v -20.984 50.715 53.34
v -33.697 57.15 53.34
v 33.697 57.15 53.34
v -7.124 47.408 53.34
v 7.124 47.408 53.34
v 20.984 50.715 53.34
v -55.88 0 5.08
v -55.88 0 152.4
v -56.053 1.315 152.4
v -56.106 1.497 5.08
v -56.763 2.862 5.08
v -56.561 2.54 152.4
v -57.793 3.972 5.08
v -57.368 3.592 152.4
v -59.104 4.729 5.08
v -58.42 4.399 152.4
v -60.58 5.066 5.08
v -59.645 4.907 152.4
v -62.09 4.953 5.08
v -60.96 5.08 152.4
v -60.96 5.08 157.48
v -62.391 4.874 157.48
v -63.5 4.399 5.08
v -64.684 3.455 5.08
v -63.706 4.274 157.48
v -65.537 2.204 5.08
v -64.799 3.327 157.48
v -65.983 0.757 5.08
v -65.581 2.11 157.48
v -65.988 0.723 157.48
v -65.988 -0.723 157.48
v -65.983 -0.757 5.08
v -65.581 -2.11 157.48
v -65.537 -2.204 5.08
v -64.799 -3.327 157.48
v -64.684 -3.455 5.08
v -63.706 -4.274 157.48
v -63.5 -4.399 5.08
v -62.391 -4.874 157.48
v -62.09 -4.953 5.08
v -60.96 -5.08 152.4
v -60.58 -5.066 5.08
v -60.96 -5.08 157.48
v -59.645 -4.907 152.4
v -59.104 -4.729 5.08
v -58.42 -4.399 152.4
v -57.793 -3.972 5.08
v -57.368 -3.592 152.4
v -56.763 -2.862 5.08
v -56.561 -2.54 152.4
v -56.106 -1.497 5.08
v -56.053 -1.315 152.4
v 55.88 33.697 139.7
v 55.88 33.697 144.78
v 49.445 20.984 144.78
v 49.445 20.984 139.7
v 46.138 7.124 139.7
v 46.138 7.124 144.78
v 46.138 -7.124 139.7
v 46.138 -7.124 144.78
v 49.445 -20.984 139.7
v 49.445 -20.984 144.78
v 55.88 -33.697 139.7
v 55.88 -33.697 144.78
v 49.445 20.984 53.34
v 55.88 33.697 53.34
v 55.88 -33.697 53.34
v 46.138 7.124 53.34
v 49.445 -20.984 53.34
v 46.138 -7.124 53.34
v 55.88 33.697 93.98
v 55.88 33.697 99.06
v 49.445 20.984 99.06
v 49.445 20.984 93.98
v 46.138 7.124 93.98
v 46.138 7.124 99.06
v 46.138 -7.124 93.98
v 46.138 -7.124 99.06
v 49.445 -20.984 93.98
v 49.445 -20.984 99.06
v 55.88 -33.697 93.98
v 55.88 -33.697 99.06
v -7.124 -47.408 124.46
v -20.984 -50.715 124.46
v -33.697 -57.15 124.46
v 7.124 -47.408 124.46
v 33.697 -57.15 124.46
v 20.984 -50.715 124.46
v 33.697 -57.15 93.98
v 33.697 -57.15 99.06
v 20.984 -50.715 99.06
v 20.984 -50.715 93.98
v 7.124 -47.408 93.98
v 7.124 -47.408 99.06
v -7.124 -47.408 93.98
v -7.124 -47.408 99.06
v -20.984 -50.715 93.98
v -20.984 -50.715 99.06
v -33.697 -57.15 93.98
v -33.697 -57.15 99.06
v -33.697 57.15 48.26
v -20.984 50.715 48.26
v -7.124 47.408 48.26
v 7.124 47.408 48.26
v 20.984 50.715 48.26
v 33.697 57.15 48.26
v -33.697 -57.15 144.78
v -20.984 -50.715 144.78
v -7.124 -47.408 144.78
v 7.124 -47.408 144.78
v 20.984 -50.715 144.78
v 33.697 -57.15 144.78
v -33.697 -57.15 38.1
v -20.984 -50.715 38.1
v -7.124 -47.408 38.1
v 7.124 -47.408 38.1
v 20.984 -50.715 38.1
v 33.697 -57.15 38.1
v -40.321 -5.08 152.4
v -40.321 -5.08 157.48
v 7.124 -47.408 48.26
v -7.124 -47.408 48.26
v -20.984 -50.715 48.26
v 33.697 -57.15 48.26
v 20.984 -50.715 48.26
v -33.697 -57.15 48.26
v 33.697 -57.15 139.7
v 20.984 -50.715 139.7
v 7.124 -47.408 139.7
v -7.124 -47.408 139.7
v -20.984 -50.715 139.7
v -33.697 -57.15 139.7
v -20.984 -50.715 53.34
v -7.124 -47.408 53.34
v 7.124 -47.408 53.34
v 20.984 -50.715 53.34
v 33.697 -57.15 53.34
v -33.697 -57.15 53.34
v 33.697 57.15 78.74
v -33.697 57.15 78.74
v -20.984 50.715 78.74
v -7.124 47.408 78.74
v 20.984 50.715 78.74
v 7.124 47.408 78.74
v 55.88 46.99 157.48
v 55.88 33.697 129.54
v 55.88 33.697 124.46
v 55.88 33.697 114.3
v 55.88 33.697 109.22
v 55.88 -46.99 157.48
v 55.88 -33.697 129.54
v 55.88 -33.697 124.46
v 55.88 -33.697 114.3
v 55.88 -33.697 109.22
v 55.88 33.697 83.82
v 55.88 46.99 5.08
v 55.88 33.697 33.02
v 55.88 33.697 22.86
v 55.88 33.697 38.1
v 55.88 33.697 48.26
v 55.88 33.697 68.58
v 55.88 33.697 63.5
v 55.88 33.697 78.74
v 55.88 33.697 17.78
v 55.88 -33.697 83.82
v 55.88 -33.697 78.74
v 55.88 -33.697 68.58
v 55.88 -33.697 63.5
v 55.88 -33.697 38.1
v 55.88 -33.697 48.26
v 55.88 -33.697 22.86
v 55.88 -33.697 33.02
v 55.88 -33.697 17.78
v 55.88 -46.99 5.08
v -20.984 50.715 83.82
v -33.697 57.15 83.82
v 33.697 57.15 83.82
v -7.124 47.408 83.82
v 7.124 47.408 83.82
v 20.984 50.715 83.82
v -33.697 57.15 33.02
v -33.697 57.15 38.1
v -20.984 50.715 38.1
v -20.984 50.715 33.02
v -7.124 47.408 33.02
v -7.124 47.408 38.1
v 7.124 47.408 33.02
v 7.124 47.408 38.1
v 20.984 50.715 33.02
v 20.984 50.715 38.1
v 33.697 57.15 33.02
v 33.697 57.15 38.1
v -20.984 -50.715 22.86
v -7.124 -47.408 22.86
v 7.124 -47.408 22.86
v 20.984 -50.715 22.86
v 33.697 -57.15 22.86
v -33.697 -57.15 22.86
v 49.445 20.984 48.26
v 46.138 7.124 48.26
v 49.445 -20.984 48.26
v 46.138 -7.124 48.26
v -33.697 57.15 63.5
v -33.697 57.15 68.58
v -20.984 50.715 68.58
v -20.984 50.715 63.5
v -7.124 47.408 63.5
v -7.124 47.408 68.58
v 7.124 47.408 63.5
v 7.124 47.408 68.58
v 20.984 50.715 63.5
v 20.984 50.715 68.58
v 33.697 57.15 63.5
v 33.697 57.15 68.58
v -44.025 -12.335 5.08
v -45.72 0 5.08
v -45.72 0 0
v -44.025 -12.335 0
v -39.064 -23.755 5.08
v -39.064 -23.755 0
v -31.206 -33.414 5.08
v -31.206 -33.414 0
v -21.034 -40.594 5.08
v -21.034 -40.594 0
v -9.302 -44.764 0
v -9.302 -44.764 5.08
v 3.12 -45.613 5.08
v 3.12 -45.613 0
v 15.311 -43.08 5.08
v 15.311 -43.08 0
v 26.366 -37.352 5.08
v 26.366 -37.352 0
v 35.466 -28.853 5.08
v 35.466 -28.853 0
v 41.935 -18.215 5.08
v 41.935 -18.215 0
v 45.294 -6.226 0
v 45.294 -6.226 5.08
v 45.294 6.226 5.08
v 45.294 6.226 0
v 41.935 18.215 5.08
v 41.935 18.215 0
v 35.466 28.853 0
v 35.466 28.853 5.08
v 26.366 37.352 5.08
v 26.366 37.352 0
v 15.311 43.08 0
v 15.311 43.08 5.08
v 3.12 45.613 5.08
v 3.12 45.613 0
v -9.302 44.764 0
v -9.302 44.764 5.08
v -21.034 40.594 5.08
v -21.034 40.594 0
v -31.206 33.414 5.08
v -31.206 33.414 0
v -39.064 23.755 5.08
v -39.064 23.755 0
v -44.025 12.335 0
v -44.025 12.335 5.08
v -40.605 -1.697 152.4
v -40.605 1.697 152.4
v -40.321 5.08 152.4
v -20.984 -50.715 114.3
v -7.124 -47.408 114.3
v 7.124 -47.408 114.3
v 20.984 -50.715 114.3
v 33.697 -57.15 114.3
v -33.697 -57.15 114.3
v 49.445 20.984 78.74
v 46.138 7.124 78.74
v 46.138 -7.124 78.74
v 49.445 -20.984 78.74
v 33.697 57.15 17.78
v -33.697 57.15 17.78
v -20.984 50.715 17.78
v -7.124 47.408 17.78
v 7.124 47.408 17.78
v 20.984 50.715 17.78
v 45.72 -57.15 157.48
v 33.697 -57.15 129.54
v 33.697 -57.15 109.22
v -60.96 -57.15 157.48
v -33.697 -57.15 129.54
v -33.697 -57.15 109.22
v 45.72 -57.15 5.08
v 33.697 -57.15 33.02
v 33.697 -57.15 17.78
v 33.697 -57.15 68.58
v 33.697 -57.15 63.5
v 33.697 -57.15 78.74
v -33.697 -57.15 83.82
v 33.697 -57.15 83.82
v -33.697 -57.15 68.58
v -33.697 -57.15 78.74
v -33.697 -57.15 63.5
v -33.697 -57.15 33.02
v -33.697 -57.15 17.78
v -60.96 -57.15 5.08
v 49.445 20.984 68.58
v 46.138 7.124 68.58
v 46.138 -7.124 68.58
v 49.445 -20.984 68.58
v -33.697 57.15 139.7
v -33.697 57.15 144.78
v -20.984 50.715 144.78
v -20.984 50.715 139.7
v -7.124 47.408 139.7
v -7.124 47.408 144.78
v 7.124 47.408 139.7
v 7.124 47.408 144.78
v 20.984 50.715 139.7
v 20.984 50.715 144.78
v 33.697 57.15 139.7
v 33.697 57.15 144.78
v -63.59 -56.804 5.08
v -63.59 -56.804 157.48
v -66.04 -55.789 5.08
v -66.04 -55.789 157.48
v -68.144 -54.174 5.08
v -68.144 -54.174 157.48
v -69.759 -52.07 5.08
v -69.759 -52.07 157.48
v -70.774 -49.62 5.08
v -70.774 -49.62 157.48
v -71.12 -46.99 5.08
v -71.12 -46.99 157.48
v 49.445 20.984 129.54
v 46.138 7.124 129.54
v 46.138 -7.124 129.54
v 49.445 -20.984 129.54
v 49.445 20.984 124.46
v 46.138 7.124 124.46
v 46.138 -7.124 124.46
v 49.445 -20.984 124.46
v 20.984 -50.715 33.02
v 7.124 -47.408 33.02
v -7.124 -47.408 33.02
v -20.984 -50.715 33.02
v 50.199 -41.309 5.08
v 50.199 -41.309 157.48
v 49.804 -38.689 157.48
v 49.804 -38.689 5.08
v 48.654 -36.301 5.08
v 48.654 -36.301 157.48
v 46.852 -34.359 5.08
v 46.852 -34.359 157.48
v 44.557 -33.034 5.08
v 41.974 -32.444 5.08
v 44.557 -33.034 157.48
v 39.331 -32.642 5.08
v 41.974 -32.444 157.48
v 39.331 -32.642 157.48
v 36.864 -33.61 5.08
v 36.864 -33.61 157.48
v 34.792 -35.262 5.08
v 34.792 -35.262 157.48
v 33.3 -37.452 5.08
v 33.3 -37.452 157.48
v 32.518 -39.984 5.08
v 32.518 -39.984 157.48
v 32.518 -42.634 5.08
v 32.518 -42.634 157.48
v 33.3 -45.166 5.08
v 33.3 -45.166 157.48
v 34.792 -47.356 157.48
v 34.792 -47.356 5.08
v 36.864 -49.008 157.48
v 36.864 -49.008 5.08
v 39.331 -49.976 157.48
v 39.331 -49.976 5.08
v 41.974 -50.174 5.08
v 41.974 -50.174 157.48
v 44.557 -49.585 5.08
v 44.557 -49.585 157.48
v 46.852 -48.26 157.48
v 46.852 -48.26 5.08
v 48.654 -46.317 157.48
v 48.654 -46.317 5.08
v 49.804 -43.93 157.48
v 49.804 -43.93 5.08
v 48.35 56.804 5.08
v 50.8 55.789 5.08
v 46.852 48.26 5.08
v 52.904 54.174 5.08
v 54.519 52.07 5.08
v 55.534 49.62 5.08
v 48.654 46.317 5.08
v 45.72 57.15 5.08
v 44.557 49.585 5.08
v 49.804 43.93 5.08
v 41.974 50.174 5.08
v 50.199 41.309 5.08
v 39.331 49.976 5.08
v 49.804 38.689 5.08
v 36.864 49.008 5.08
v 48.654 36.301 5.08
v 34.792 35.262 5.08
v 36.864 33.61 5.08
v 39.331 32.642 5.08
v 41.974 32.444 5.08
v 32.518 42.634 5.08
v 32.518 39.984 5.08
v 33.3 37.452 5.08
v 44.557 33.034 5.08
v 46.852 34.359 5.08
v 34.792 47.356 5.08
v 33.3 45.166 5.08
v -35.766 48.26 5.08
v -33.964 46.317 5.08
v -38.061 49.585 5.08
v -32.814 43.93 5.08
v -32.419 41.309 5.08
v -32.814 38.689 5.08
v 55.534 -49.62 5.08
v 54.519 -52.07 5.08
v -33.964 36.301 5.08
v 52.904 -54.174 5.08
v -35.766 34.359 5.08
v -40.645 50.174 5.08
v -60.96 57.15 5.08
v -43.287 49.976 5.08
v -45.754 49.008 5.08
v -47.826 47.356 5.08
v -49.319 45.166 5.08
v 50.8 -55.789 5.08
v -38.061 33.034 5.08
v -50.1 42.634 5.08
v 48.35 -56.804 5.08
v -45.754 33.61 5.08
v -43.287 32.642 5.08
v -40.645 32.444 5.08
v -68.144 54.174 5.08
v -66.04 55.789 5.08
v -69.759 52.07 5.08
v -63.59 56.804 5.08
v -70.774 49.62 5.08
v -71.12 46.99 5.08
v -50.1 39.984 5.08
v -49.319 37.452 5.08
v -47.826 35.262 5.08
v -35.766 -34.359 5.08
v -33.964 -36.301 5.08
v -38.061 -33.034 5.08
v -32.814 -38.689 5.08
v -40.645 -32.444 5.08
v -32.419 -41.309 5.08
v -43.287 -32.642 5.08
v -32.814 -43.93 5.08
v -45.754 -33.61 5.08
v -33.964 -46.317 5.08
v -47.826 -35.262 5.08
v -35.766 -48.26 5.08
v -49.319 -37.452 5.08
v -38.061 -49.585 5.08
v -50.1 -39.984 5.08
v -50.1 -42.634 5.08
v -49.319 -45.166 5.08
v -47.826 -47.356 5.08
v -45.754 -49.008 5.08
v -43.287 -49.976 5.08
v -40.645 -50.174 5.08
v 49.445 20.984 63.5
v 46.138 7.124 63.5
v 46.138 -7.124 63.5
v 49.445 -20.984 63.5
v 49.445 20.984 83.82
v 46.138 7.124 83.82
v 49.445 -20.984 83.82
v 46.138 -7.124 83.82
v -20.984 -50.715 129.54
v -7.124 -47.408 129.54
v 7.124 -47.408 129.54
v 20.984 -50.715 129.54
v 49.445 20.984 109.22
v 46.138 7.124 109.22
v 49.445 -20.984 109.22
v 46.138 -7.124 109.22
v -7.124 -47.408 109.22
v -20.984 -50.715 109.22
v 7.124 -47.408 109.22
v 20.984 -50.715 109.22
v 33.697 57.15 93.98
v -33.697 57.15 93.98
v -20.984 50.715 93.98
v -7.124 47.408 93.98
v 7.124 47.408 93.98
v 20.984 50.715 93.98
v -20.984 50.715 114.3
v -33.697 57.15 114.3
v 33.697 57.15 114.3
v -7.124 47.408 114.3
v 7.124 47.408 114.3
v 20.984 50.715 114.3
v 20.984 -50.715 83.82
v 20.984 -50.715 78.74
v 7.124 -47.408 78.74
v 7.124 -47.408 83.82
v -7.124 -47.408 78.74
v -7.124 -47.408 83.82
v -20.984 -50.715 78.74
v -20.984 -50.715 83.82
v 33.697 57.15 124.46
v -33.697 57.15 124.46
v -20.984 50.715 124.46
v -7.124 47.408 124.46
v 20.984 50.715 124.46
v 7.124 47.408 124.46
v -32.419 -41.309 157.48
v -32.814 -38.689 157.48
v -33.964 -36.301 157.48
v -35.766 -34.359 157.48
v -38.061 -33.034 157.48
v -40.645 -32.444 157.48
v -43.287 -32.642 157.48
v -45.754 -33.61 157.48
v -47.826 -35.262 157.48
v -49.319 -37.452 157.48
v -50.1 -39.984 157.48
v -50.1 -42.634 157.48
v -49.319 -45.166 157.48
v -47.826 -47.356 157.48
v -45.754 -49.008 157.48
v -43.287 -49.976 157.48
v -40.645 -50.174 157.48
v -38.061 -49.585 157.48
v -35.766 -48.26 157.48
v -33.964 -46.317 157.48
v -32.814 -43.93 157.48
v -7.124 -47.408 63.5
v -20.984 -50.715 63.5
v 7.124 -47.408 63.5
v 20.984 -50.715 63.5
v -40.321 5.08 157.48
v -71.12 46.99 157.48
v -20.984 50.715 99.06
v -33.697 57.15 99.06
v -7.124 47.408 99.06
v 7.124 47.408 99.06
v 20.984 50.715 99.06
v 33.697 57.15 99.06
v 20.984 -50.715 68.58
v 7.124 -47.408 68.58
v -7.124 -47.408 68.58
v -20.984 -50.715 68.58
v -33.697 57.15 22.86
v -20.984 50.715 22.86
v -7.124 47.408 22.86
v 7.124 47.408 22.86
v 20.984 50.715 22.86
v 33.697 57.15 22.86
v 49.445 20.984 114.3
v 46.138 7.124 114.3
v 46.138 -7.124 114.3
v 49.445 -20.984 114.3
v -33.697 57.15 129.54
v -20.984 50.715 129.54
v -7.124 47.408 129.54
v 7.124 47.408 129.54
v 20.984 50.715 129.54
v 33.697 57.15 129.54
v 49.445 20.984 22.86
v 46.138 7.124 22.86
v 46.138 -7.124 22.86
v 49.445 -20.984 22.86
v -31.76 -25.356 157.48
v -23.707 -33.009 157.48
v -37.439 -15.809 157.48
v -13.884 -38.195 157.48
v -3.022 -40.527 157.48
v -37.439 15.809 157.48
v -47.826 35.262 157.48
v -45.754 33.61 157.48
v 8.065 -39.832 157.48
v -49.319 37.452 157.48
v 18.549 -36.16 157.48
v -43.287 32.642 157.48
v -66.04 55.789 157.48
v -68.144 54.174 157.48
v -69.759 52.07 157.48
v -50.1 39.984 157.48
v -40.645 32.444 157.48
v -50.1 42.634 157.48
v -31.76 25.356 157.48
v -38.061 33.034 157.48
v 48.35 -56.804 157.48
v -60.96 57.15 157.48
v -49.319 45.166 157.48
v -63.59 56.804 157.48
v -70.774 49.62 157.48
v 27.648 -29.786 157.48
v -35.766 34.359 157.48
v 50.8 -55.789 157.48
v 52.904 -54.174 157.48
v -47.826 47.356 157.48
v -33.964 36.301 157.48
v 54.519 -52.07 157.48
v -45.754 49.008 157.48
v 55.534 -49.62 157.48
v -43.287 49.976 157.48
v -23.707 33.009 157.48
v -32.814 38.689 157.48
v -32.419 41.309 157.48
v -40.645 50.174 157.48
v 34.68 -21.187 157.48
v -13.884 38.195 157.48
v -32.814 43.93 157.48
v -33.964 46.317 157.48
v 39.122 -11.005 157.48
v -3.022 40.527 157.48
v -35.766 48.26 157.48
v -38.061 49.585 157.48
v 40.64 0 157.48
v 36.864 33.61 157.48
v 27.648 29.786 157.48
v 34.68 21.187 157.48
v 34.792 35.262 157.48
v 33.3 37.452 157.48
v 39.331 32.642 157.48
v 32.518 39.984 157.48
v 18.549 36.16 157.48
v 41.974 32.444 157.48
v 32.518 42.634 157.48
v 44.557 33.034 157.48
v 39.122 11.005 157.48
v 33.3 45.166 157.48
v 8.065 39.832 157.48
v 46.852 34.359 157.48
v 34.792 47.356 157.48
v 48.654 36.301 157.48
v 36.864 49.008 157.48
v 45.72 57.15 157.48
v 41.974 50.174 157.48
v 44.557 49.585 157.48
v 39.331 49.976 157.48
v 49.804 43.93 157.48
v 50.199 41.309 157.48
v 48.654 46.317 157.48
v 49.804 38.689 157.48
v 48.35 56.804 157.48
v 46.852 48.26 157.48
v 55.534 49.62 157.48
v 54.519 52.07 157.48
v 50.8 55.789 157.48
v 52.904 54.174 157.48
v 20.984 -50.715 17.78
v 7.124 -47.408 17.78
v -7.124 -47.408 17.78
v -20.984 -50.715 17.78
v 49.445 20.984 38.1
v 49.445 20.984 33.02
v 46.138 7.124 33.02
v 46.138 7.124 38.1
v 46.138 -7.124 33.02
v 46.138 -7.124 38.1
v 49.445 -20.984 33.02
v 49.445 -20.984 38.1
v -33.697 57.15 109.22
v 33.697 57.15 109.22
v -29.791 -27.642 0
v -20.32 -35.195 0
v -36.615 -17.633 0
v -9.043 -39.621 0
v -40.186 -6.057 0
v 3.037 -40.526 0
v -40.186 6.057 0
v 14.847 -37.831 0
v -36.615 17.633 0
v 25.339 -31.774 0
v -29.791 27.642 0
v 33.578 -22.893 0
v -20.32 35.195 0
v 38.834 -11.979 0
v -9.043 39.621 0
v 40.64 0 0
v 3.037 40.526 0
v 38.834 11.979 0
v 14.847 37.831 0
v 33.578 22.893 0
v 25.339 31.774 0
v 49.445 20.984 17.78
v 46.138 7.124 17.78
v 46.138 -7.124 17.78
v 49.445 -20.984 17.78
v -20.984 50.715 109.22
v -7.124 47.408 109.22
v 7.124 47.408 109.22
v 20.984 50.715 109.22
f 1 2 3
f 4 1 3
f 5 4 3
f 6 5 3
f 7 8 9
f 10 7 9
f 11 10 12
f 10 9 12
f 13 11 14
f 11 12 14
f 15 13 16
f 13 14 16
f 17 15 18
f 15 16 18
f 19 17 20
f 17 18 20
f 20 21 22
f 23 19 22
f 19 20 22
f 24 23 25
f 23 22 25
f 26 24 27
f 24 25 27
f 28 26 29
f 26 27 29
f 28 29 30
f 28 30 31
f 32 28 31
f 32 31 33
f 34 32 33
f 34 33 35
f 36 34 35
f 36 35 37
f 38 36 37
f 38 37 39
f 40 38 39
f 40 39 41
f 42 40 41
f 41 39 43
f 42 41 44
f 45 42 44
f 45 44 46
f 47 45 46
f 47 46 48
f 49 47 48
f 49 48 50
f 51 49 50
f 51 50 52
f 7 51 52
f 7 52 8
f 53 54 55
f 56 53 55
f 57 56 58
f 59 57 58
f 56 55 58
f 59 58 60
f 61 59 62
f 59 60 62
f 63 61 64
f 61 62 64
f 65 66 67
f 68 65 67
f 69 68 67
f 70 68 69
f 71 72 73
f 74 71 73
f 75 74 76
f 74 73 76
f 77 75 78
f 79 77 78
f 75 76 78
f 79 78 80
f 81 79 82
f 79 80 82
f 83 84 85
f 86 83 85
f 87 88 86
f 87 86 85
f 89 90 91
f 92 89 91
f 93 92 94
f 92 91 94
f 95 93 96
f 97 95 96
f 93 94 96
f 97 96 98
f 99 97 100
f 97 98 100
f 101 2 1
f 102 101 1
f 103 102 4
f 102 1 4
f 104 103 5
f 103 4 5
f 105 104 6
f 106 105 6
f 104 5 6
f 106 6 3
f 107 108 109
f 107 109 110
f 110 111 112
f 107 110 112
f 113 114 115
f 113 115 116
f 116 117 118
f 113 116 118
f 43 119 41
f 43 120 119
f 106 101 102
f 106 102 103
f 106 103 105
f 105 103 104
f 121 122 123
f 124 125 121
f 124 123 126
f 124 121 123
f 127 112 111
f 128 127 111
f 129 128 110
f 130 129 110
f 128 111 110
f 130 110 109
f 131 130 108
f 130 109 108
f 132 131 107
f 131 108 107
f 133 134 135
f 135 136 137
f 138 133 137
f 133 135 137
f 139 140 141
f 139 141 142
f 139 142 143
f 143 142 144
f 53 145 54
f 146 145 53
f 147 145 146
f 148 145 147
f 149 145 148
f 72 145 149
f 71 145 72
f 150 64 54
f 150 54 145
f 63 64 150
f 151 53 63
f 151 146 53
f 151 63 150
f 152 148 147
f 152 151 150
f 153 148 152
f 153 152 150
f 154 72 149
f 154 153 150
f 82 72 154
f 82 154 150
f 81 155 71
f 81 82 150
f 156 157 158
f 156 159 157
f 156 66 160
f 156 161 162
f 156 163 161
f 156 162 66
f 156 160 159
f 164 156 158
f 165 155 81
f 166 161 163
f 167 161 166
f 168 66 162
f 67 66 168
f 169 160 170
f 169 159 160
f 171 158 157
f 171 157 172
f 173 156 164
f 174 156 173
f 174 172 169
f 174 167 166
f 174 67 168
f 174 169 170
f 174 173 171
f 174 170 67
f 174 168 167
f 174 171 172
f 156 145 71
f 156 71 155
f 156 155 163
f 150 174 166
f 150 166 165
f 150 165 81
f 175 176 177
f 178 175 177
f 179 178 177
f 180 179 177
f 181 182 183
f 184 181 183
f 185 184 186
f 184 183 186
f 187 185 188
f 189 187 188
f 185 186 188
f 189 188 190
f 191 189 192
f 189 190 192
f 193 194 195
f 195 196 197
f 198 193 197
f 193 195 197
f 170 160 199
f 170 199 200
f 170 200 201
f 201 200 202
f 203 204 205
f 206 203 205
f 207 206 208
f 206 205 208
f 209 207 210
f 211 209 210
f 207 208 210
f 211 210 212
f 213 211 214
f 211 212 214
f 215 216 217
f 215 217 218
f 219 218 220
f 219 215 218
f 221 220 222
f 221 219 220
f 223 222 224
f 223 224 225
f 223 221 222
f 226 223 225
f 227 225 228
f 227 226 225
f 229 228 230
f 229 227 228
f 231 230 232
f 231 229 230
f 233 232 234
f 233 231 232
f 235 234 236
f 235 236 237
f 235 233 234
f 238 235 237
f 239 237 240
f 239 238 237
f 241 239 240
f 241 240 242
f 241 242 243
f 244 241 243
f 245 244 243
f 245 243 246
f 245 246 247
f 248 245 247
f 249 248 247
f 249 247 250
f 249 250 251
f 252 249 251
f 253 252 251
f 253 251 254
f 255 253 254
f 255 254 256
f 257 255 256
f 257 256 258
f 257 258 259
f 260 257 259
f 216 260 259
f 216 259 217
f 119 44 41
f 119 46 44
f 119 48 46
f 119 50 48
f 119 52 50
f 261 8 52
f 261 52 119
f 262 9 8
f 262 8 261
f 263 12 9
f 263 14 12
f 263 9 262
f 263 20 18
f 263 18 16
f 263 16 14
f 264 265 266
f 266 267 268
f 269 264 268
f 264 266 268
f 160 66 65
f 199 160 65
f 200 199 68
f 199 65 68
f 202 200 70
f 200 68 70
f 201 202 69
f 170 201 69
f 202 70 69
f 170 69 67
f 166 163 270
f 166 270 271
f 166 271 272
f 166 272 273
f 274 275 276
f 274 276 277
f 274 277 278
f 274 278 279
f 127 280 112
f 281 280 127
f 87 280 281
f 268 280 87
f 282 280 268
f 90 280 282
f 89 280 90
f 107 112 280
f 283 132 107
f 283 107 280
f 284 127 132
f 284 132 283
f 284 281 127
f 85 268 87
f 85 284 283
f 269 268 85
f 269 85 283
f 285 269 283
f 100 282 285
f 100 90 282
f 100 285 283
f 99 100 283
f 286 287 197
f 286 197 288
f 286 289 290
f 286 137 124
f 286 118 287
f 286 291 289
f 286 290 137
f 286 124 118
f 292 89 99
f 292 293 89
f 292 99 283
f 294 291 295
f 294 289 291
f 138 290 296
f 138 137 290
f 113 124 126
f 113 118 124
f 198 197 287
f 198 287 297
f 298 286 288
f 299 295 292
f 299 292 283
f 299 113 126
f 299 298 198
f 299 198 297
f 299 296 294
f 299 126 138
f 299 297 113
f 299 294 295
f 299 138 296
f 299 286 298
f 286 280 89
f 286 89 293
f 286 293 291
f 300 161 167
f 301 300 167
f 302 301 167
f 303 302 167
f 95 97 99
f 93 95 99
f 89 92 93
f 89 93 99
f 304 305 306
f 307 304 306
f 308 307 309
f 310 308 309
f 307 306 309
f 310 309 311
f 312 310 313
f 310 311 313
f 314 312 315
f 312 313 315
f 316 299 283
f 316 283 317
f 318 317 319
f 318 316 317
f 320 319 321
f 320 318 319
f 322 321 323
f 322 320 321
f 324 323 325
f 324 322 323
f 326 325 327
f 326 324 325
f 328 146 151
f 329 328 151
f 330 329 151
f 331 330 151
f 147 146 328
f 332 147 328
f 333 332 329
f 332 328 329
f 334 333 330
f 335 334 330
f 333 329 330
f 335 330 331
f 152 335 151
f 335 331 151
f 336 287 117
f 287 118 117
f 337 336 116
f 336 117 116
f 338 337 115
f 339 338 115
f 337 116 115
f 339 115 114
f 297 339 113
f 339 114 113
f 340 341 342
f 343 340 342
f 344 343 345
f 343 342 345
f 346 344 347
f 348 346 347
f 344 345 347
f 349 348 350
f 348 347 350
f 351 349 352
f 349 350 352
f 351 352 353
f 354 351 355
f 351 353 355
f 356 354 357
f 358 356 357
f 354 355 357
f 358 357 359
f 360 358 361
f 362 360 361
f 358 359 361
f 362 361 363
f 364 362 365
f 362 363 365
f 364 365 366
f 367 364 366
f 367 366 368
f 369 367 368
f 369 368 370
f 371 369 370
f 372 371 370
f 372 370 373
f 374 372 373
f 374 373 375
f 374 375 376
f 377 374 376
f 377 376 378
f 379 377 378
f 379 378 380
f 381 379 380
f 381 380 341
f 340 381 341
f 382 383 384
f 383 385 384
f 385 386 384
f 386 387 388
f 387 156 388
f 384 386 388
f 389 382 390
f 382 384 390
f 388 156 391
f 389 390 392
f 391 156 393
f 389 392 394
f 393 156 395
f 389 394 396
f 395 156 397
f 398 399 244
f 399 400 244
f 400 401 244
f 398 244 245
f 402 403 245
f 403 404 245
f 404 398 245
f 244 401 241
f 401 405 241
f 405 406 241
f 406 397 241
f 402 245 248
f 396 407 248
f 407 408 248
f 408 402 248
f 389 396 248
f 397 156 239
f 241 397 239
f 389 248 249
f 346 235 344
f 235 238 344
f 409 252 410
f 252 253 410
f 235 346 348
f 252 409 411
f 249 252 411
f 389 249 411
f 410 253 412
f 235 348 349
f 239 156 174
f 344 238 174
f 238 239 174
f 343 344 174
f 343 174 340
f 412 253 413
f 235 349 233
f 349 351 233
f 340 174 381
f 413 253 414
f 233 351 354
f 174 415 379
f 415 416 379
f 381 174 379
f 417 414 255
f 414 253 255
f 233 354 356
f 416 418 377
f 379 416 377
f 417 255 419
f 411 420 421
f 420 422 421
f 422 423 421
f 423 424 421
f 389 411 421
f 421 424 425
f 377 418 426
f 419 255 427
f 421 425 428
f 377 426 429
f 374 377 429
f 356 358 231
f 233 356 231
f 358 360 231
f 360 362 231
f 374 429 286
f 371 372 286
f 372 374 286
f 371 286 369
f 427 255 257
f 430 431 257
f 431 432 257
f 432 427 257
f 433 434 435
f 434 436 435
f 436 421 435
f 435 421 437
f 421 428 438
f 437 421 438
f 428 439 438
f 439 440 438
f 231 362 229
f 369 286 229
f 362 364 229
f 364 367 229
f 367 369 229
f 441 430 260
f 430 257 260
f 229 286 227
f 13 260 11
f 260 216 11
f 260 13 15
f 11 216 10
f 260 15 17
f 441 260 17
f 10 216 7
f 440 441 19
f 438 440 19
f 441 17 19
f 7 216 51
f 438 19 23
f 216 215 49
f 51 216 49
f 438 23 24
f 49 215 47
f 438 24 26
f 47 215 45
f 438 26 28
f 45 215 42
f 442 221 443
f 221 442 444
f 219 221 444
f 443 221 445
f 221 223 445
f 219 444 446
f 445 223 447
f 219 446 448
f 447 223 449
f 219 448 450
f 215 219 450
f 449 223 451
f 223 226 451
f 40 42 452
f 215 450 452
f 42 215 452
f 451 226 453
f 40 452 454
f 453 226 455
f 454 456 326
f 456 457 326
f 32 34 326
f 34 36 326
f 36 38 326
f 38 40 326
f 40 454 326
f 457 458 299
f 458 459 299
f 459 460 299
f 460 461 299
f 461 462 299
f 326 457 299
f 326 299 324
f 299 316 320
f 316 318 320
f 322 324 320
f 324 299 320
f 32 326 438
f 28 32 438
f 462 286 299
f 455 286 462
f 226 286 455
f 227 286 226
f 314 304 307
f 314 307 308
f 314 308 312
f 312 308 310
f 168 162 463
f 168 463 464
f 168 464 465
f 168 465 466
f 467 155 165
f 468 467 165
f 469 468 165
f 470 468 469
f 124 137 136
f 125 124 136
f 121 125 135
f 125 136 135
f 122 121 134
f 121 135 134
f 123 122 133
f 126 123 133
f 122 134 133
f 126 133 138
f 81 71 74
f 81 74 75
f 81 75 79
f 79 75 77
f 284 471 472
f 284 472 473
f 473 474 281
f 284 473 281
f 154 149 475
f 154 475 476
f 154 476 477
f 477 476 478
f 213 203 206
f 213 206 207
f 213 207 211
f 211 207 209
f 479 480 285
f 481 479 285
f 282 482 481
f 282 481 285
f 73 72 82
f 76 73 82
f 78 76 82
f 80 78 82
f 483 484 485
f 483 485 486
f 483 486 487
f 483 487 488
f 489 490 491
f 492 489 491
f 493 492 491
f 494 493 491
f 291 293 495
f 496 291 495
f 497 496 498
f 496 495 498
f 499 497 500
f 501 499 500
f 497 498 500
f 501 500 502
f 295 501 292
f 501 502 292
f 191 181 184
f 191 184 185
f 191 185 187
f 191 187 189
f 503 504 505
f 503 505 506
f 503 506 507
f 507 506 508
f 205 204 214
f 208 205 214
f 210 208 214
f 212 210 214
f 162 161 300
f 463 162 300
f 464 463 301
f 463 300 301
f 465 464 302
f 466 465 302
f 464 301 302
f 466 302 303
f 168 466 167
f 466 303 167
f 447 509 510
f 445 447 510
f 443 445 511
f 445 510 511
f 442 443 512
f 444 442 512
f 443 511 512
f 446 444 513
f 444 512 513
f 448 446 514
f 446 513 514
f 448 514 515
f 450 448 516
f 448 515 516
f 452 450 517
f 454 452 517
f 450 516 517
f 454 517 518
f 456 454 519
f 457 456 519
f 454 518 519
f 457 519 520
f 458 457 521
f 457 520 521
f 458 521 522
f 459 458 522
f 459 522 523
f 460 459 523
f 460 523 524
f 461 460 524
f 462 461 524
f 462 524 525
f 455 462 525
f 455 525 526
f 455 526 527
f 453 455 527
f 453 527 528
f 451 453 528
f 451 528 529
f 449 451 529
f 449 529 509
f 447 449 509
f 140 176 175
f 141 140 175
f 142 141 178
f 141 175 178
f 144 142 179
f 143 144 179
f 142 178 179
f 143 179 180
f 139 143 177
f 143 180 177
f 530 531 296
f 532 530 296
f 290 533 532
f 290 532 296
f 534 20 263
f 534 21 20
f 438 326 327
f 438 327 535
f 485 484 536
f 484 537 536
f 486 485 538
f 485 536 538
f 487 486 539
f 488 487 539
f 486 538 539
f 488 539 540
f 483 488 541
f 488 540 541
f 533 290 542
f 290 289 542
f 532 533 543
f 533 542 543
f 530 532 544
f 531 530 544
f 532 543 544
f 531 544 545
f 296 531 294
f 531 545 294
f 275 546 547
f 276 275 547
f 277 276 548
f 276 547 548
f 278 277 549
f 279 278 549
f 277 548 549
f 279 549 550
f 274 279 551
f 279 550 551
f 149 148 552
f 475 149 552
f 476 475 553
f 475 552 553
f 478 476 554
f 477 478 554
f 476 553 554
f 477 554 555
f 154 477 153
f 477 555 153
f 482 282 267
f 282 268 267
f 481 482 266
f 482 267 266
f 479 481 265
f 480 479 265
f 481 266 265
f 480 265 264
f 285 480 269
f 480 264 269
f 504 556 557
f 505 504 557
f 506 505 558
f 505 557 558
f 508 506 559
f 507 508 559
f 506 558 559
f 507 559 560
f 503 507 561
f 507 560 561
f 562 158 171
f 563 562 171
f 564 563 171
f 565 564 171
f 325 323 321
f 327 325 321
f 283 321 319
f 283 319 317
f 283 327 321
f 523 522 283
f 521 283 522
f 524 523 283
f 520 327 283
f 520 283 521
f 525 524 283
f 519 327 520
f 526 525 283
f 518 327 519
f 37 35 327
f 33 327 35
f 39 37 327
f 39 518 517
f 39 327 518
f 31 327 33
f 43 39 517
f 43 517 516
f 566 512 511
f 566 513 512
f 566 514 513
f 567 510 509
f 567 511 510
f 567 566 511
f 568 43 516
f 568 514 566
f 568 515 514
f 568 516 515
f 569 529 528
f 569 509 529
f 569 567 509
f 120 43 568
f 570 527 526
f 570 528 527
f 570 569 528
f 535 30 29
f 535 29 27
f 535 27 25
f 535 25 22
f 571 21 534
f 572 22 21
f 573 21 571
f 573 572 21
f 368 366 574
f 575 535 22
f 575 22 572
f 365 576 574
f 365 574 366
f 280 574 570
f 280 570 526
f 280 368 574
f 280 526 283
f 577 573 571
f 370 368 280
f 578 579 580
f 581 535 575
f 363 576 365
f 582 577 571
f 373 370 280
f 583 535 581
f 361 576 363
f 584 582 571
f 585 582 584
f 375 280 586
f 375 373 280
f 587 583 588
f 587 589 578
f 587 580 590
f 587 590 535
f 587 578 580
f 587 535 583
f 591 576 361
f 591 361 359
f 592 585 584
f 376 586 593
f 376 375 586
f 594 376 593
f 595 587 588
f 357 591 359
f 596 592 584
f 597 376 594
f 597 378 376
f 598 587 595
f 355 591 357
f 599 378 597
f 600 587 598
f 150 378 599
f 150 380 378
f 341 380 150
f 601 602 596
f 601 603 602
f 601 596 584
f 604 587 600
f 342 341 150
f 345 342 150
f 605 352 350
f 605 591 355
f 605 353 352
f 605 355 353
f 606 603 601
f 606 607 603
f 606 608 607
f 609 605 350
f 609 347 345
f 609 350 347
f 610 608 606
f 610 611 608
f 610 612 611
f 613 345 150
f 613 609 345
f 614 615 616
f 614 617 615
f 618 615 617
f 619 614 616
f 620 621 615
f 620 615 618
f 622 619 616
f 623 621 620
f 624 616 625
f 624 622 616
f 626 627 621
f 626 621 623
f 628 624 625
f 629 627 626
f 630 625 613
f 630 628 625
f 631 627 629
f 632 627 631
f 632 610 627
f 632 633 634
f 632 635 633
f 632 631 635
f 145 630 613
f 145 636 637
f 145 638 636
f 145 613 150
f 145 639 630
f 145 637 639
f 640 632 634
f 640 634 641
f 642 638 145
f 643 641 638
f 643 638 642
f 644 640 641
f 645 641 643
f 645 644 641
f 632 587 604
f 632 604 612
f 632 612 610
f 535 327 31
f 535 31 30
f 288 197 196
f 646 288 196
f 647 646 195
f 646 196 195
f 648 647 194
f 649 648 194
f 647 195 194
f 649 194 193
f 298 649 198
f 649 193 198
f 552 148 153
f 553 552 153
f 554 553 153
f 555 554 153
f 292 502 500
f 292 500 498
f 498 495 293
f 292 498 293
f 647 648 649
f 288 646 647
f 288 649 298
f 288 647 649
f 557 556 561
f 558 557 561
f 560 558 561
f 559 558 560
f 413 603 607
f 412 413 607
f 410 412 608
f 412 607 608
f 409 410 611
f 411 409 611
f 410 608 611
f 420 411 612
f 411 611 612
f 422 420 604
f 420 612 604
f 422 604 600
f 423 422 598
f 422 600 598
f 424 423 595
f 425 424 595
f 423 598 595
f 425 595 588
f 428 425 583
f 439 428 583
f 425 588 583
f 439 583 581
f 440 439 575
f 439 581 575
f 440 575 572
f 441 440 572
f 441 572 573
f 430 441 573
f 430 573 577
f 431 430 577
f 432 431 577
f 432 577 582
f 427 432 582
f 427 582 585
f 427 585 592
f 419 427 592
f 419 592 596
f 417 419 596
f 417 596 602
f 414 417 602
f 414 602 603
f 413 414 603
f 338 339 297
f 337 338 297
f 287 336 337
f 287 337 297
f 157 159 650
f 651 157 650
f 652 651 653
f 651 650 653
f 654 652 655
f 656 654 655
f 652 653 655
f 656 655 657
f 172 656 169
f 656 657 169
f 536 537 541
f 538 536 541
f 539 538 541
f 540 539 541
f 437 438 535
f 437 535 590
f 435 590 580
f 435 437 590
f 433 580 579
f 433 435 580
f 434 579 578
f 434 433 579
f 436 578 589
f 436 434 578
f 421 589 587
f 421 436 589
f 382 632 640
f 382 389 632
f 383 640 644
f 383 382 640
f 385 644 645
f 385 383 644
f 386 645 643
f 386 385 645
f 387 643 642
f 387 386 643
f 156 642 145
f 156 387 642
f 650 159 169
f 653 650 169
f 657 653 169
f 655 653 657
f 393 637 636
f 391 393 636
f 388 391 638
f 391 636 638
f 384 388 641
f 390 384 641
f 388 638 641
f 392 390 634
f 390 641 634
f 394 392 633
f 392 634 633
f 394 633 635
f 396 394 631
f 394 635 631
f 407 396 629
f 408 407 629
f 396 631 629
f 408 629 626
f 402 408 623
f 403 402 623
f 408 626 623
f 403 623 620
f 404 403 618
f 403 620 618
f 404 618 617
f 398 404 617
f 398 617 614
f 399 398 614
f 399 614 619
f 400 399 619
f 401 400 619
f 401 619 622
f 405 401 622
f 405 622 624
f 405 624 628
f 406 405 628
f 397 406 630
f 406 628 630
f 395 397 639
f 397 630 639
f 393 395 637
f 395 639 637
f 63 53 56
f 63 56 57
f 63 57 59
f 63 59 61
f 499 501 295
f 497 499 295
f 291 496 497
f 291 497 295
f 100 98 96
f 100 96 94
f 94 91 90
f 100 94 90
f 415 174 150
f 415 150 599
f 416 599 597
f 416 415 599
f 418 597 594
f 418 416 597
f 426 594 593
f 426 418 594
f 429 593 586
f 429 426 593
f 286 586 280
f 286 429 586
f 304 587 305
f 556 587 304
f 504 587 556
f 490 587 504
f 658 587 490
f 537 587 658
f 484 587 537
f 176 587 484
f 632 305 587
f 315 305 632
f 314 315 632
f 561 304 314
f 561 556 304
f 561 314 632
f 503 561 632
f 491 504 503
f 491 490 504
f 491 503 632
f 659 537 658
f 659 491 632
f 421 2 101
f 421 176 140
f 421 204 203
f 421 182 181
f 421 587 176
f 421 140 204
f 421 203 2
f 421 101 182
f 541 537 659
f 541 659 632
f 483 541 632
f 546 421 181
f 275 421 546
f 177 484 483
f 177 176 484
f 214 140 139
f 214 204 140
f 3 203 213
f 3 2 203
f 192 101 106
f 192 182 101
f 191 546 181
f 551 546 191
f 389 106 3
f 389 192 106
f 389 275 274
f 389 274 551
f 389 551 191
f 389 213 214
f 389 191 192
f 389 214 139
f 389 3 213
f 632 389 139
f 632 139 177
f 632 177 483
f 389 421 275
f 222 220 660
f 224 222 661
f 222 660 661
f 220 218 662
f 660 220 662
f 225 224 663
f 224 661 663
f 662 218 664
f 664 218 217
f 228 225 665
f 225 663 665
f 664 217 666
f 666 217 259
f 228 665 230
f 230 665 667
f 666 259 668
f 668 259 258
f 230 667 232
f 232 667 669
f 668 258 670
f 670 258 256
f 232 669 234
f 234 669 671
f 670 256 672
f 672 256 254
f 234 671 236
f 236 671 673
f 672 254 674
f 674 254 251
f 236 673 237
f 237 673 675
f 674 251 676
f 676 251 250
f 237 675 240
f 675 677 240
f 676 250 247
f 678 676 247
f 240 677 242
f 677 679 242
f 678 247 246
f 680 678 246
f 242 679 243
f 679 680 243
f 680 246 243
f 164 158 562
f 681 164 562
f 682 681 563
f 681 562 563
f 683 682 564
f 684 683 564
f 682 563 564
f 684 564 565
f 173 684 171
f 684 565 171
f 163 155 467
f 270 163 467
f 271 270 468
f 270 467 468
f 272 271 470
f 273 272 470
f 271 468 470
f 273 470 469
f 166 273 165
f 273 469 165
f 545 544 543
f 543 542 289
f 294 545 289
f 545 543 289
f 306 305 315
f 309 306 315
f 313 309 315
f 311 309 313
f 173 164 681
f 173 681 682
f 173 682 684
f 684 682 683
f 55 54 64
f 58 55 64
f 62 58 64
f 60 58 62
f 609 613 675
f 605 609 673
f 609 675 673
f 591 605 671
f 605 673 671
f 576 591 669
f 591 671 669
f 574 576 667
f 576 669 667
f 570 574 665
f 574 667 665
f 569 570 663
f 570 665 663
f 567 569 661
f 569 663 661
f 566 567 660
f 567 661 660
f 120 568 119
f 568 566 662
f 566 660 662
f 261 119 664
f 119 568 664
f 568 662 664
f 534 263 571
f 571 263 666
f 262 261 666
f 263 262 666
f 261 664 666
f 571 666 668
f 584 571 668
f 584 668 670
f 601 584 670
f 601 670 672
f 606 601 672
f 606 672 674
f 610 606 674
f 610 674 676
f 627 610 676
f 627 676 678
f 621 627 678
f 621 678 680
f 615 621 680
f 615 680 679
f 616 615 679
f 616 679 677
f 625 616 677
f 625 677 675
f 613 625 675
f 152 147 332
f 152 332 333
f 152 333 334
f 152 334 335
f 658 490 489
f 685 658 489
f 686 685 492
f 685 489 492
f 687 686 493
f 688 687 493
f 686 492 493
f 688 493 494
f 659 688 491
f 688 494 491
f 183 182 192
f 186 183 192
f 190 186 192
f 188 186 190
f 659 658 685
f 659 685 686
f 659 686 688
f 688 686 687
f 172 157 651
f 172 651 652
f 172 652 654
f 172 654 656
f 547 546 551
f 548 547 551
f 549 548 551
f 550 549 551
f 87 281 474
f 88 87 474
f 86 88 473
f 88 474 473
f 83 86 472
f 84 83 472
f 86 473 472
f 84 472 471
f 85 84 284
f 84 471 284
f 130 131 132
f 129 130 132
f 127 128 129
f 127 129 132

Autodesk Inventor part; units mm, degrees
ref_plane "YZ Plane" through (0, 0, 0) normal (1, 0, 0) x (0, 1, 0)
ref_plane "XZ Plane" through (0, 0, 0) normal (0, 1, 0) x (-1, 0, 0)
ref_plane "XY Plane" through (0, 0, 0) normal (0, 0, 1) x (1, 0, 0)
sketch "Sketch1" plane through (0, 0, 0) normal (0, 0, 1) x (1, 0, 0)
  line L0 (-60.96, 57.15) -> (45.72, 57.15)
  line L1 (55.88, 46.99) -> (55.88, -46.99)
  line L2 (45.72, -57.15) -> (-60.96, -57.15)
  line L3 (-71.12, -46.99) -> (-71.12, 46.99)
  line L4 (-99.4659, 0) -> (84.2259, 0) projected
  line L5 (0, -82.9559) -> (0, 82.9559) projected
  arc A0 (-60.96, 57.15) -> (-71.12, 46.99) centre (-60.96, 46.99) ccw
  arc A1 (55.88, 46.99) -> (45.72, 57.15) centre (45.72, 46.99) ccw
  arc A2 (45.72, -57.15) -> (55.88, -46.99) centre (45.72, -46.99) ccw
  arc A3 (-71.12, -46.99) -> (-60.96, -57.15) centre (-60.96, -46.99) ccw
  circle A4 centre (0, 0) radius 40.64
  point P0 (55.88, -57.15)
  point P1 (55.88, 57.15)
  point P2 (-71.12, -57.15)
  point P3 (-71.12, 0)
  dimension "d0" = 127
  dimension "d1" = 114.3
  dimension "d2" = 55.88
  dimension "d3" = 10.16
  dimension "d6" = 81.28
extrude "Extrusion1" add sketch "Sketch1" along normal blind 157.48
extrude "Extrusion2" cut sketch "Sketch1" along normal blind 157.48 contours A4 L4 L5 | L5 L4 A4 | L5 A4 L4 | L4 A4 L5
sketch "Sketch2" plane through (0, 0, 157.48) normal (0, 0, 1) x (1, 0, 0)
  circle A0 centre (0, 0) radius 58.42 construction
  line L0 (0, 0) -> (45.72, 45.72) construction
  line L1 (0, 0) -> (64.6578, 0) construction
  circle A1 centre (41.3092, 41.3092) radius 8.89
  circle A2 centre (-41.3092, 41.3092) radius 8.89
  circle A3 centre (-41.3092, -41.3092) radius 8.89
  circle A4 centre (41.3092, -41.3092) radius 8.89
  dimension "d9" = 116.84
  dimension "d10" = 45
  dimension "d11" = 17.78
  dimension "d14" = 360
extrude "Extrusion3" cut sketch "Sketch2" against normal through all
sketch "Sketch3" plane through (0, 0, 157.48) normal (0, 0, 1) x (1, 0, 0)
  circle A0 centre (-60.96, 0) radius 5.08
  line L0 (-60.96, 5.08) -> (-31.75, 5.08)
  line L1 (-31.75, 5.08) -> (-31.75, -5.08)
  line L2 (-31.75, -5.08) -> (-60.96, -5.08)
  line L3 (-96.52, 0) -> (81.28, 0) projected
  point P0 (0, 0)
  point P1 (-31.75, 0)
  dimension "d18" = 10.16
  dimension "d19" = 60.96
  dimension "d20" = 10.16
extrude "Extrusion4" cut sketch "Sketch3" against normal through all contours L3 A0 | A0 L3
extrude "Extrusion5" cut sketch "Sketch3" against normal blind 5.08 contours L3 L1 L2 A0 | A0 L0 L1 L3
sketch "Sketch4" plane through (0, 0, 0) normal (0, 1, 0) x (-1, 0, 0)
  line L0 (45.72, 5.08) -> (-45.72, 5.08)
  line L1 (-45.72, 5.08) -> (-45.72, 0)
  line L2 (-45.72, 0) -> (45.72, 0)
  line L3 (45.72, 0) -> (45.72, 5.08)
  line L4 (0, -49.022) -> (0, 191.897) projected
  line L5 (-45.72, 0) -> (-55.88, 0) projected
  line L6 (60.96, 0) -> (-45.72, 0) projected
  line L7 (-45.72, 0) -> (-45.72, 157.48) projected
  line L8 (60.96, 157.48) -> (-45.72, 157.48) projected
  line L9 (60.96, 0) -> (60.96, 157.48) projected
  line L10 (40.64, 152.4) -> (55.88, 152.4) projected
  line L11 (55.88, 152.4) -> (55.88, 0) projected
  line L12 (55.88, 0) -> (40.64, 0) projected
  line L13 (40.64, 0) -> (40.64, 152.4) projected
  line L14 (71.12, 157.48) -> (71.12, 0) projected
  line L15 (71.12, 0) -> (66.04, 0) projected
  line L16 (66.04, 0) -> (66.04, 157.48) projected
  line L17 (66.04, 157.48) -> (71.12, 157.48) projected
  line L18 (-55.88, 0) -> (-55.88, 157.48) projected
  line L19 (-55.88, 157.48) -> (-40.64, 157.48) projected
  line L20 (-40.64, 157.48) -> (-40.64, 0) projected
  line L21 (-40.64, 0) -> (-55.88, 0) projected
  line L22 (45.72, 0) -> (96.52, 0)
  line L23 (96.52, 0) -> (96.52, 5.08)
  line L24 (96.52, 5.08) -> (45.72, 5.08)
  line L25 (45.72, 5.08) -> (45.72, 0)
  point P0 (0, 0)
  point P1 (0, 5.08)
  dimension "d25" = 91.44
  dimension "d26" = 5.08
  dimension "d27" = 50.8
revolve "Revolution1" cut sketch "Sketch4" angle 360 about axis through (0, 0, -10) along (0, 0, 1) contours L24 L11 L6 L3 | L24 L9 L6 L11 | L24 L16 L22 L9 | L24 L14 L15 L16 | L24 L23 L22 L14
ref_plane "Work Plane1" through (0, 0, 144.78) normal (0, 0, 1) x (1, 0, 0)
sketch "Sketch5" plane through (0, 0, 144.78) normal (0, 0, 1) x (1, 0, 0)
  arc A0 (-60.96, 57.15) -> (-71.12, 46.99) centre (-60.96, 46.99) ccw
  line L0 (-60.96, 57.15) -> (45.72, 57.15)
  arc A1 (55.88, 46.99) -> (45.72, 57.15) centre (45.72, 46.99) ccw
  line L1 (55.88, 46.99) -> (55.88, -46.99)
  arc A2 (45.72, -57.15) -> (55.88, -46.99) centre (45.72, -46.99) ccw
  line L2 (45.72, -57.15) -> (-60.96, -57.15)
  arc A3 (-71.12, -46.99) -> (-60.96, -57.15) centre (-60.96, -46.99) ccw
  line L3 (-71.12, -46.99) -> (-71.12, 46.99)
  circle A4 centre (-60.96, 0) radius 5.08
  circle A5 centre (41.3092, -41.3092) radius 8.89
  circle A6 centre (-41.3092, -41.3092) radius 8.89
  circle A7 centre (41.3092, 41.3092) radius 8.89
  circle A8 centre (-41.3092, 41.3092) radius 8.89
  circle A9 centre (0, 0) radius 40.64
sketch "Sketch6" plane through (0, 0, 144.78) normal (0, 0, 1) x (1, 0, 0)
  arc A0 (55.88, 33.6969) -> (55.88, -33.6969) centre (106.68, 0) ccw
  line L0 (55.88, -46.99) -> (55.88, 46.99) projected
  arc A1 (-33.6969, 57.15) -> (33.6969, 57.15) centre (0, 107.95) ccw
  line L1 (45.72, 57.15) -> (-60.96, 57.15) projected
  arc A2 (33.6969, -57.15) -> (-33.6969, -57.15) centre (0, -107.95) ccw
  line L2 (-60.96, -57.15) -> (45.72, -57.15) projected
  line L3 (-40.3212, -5.08) -> (-60.96, -5.08) projected
  arc A3 (-60.96, 5.08) -> (-60.96, -5.08) centre (-60.96, 0) ccw projected
  line L4 (-60.96, 5.08) -> (-40.3212, 5.08) projected
  arc A4 (-40.3212, -5.08) -> (-40.3212, 5.08) centre (0, 0) ccw projected
  circle A5 centre (41.3092, -41.3092) radius 8.89 projected
  circle A6 centre (-41.3092, -41.3092) radius 8.89 projected
  circle A7 centre (41.3092, 41.3092) radius 8.89 projected
  circle A8 centre (-41.3092, 41.3092) radius 8.89 projected
  line L5 (55.88, -46.99) -> (55.88, 46.99) projected
  arc A9 (55.88, 46.99) -> (45.72, 57.15) centre (45.72, 46.99) ccw projected
  line L6 (45.72, 57.15) -> (-60.96, 57.15) projected
  arc A10 (-60.96, 57.15) -> (-71.12, 46.99) centre (-60.96, 46.99) ccw projected
  line L7 (-71.12, 46.99) -> (-71.12, -46.99) projected
  arc A11 (-71.12, -46.99) -> (-60.96, -57.15) centre (-60.96, -46.99) ccw projected
  line L8 (-60.96, -57.15) -> (45.72, -57.15) projected
  arc A12 (45.72, -57.15) -> (55.88, -46.99) centre (45.72, -46.99) ccw projected
  arc A13 (-60.96, 57.15) -> (-71.12, 46.99) centre (-60.96, 46.99) ccw projected
  line L9 (-60.96, 57.15) -> (45.72, 57.15) projected
  arc A14 (55.88, 46.99) -> (45.72, 57.15) centre (45.72, 46.99) ccw projected
  line L10 (55.88, 46.99) -> (55.88, -46.99) projected
  arc A15 (45.72, -57.15) -> (55.88, -46.99) centre (45.72, -46.99) ccw projected
  line L11 (45.72, -57.15) -> (-60.96, -57.15) projected
  arc A16 (-71.12, -46.99) -> (-60.96, -57.15) centre (-60.96, -46.99) ccw projected
  line L12 (-71.12, -46.99) -> (-71.12, 46.99) projected
  circle A17 centre (-60.96, 0) radius 5.08 projected
  circle A18 centre (41.3092, -41.3092) radius 8.89 projected
  circle A19 centre (-41.3092, -41.3092) radius 8.89 projected
  circle A20 centre (41.3092, 41.3092) radius 8.89 projected
  circle A21 centre (-41.3092, 41.3092) radius 8.89 projected
  circle A22 centre (0, 0) radius 40.64 projected
  dimension "d32" = 121.92
  dimension "d33" = 50.8
  dimension "d34" = 121.92
  dimension "d35" = 50.8
  dimension "d36" = 121.92
  dimension "d37" = 50.8
extrude "Extrusion6" cut sketch "Sketch6" against normal blind 5.08 contours L0 A0 | A1 L1 | L2 A2
pattern_linear "Rectangular Pattern1" count 9 spacing 15.24 along (0, 0, -1) of "Extrusion6"
equation "\"BendRadius\" = Thickness"
equation "\"BendReliefWidth\" = Thickness"
equation "\"BendReliefDepth\" = 0.5 * Thickness"
equation "\"CornerReliefSize\" = 4 * Thickness"
equation "\"MinimumRemnant\" = 2 * Thickness"
equation "\"TransitionRadius\" = BendRadius"
equation "\"JacobiRadiusSize\" = BendRadius"
equation "\"GapSize\" = Thickness"
equation "\"Thickness\" = 3.048"
properties part number "cylinder" material "Aluminum 6061"
